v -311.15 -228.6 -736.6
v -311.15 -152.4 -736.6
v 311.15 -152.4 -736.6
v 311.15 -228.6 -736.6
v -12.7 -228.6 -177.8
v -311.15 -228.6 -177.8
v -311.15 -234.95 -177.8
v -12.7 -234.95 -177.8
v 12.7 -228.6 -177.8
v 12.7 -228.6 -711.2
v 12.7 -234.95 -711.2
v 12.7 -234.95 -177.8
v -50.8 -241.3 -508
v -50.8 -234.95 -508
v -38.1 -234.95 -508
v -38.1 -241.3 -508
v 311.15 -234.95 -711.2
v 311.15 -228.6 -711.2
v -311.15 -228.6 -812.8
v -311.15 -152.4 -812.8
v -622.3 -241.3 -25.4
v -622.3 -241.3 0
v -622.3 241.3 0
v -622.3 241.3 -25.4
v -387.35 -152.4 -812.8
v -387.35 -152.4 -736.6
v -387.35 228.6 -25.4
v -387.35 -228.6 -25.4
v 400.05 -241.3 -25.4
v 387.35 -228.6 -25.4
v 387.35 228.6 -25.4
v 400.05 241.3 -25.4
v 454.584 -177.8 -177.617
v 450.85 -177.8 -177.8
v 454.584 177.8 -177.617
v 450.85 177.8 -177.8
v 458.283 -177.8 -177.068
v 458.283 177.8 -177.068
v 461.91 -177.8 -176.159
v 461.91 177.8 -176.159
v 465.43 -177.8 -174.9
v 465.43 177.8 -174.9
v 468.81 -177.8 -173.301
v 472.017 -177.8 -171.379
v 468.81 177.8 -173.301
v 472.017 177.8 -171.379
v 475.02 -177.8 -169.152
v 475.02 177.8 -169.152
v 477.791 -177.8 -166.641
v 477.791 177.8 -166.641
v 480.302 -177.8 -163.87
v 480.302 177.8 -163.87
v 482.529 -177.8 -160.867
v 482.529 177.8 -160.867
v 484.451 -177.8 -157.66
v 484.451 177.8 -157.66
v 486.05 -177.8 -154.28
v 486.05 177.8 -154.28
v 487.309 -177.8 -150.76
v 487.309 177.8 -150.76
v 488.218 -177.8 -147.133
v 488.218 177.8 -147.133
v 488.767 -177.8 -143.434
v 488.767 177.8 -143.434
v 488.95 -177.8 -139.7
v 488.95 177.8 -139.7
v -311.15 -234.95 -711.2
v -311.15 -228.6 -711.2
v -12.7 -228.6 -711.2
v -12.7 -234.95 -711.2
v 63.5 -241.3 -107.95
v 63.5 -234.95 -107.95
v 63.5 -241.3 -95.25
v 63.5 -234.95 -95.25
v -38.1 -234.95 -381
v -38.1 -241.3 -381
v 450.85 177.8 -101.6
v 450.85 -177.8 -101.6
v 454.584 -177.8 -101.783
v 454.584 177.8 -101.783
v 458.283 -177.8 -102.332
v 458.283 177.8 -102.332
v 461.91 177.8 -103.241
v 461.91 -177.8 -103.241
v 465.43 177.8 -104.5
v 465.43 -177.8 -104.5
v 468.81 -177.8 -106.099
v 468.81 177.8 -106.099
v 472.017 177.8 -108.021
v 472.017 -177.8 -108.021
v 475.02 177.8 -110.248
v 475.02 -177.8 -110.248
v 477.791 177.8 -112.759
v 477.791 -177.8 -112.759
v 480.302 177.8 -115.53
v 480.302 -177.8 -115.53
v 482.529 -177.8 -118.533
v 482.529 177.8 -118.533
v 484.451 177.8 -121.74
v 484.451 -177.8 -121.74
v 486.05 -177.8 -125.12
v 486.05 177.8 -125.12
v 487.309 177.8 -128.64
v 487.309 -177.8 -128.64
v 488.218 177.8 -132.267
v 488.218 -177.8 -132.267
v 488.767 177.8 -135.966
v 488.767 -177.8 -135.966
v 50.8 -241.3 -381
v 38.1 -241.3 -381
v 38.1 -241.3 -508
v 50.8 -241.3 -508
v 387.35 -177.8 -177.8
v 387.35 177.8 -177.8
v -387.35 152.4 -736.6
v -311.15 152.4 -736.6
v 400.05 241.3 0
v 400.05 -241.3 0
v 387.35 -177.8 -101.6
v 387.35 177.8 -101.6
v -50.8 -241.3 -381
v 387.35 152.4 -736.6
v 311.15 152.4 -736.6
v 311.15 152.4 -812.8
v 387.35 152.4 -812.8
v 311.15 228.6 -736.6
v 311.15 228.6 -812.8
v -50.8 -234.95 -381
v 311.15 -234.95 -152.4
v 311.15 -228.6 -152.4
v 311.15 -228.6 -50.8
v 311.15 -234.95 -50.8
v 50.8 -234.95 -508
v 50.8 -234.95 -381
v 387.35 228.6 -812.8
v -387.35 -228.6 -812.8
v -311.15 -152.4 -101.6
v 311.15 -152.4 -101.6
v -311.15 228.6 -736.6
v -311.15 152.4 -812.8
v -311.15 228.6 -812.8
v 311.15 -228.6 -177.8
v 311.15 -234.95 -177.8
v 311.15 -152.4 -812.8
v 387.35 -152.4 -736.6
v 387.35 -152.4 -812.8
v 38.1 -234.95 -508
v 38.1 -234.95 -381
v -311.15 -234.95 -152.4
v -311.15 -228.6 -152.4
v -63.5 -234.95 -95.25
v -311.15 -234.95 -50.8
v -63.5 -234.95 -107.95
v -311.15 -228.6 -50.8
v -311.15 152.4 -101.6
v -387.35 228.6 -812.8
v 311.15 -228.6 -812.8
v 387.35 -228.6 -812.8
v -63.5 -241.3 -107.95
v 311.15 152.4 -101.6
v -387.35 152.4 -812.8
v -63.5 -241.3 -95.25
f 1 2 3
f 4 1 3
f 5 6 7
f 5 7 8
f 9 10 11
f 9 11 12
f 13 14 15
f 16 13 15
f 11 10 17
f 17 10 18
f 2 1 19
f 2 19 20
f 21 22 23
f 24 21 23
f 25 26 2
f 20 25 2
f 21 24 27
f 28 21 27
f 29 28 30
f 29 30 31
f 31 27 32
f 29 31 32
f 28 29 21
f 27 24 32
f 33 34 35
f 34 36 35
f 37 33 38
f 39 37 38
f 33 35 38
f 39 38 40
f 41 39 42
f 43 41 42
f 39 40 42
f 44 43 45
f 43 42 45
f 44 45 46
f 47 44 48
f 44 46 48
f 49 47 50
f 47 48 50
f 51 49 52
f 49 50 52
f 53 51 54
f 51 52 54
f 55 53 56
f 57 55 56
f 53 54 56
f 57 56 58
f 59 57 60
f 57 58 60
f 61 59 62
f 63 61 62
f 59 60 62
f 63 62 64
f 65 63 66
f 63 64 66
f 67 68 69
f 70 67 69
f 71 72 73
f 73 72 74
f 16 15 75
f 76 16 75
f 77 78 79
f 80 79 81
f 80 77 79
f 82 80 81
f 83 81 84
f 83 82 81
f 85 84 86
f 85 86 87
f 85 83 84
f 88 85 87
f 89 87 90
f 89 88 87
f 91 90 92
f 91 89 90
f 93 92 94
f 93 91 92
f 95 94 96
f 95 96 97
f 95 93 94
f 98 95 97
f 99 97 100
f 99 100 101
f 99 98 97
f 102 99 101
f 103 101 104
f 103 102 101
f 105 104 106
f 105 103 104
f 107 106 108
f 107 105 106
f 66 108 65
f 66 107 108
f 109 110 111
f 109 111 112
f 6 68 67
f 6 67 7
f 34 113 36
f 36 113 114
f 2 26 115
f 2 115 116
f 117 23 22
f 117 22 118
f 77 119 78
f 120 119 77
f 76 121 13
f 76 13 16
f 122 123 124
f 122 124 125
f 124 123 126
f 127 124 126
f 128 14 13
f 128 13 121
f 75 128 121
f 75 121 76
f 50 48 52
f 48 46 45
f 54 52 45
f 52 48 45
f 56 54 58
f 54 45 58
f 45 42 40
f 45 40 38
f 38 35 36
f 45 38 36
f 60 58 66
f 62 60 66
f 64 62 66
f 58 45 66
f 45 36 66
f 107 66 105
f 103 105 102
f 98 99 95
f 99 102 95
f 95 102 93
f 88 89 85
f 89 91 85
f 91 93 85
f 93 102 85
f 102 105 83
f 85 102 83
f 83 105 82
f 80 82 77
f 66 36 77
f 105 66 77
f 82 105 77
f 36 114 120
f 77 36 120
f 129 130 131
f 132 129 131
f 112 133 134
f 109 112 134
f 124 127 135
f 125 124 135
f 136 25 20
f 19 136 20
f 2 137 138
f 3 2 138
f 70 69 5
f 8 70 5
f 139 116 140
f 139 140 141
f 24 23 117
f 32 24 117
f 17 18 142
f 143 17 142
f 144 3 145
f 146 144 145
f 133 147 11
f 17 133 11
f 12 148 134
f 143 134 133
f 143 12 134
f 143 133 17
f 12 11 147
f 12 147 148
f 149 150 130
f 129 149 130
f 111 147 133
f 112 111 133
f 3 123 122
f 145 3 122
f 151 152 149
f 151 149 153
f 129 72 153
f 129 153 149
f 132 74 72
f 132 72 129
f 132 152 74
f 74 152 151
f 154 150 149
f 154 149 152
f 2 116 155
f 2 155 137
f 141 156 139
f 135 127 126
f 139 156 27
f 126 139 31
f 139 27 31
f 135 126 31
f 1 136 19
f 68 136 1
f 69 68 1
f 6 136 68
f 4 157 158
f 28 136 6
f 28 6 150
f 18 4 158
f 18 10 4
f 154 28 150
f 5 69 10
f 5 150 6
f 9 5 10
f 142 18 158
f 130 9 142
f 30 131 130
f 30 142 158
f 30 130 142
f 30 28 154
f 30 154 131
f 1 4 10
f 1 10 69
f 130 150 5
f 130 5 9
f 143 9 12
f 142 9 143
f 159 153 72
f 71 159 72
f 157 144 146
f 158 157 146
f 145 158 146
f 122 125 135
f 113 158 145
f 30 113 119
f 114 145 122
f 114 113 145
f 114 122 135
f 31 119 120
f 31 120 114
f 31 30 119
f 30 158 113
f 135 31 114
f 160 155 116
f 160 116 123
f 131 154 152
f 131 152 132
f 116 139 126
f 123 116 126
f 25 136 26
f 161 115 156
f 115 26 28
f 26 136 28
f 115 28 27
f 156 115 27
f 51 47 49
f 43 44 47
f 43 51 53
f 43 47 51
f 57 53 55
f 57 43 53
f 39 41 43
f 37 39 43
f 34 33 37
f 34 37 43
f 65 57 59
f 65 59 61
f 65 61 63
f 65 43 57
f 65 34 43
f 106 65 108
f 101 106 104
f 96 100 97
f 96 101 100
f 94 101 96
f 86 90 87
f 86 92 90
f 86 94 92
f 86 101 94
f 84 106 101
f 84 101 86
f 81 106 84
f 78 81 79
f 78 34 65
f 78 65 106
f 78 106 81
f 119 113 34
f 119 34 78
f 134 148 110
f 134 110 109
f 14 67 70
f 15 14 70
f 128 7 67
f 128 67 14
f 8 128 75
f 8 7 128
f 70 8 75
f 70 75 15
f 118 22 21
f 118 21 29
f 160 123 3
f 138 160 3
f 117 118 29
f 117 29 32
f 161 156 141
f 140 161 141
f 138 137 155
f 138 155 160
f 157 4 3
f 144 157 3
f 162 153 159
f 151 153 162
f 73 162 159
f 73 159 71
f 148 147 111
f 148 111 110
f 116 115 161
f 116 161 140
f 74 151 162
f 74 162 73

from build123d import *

# Parameters (mm, degrees)
F0_W      = 76.2
F0_H      = 76.2
F1_DEPTH  = 812.8
F2_DEPTH  = 736.6
F0_W_2    = 800.1
F0_H_2    = 482.6
F3_DEPTH  = 25.4
F4_W      = 355.6
F4_H      = 76.2
F5_DEPTH  = 101.6
F6_R      = 38.09999
F7_W      = 298.45
F7_H      = 533.4
F7_W_2    = 12.7
F7_H_2    = 127
F7_W_3    = 622.3
F7_H_3    = 101.6
F7_W_4    = 127
F7_H_4    = 12.7
F8_DEPTH  = 6.35
F9_DEPTH  = 12.7
F10_W     = 222.25
F10_H     = 482.6
F11_DEPTH = 25.4
F12_W     = 622.3
F12_H     = 304.8
F13_DEPTH = 635


# Not quite as in the source:
# - a fillet or chamfer is up to 0.001 mm smaller than in the source, because OpenCascade refuses the exact size


with BuildPart() as f1:
    # F0 (on Top) → F1 (new body)
    with BuildSketch(Plane.XY):
        with Locations((-349.25, 190.5)):
            Rectangle(F0_W, F0_H)
    extrude(amount=-F1_DEPTH)



with BuildPart() as f1b:
    # F0 (on Top) → F1, piece 2 (new body)
    with BuildSketch(Plane.XY):
        with Locations((-349.25, -190.5)):
            Rectangle(F0_W, F0_H)
    extrude(amount=-F1_DEPTH)


with BuildPart() as f1c:
    # F0 (on Top) → F1, piece 3 (new body)
    with BuildSketch(Plane.XY):
        with Locations((349.25, -190.5)):
            Rectangle(F0_W, F0_H)
    extrude(amount=-F1_DEPTH)


with BuildPart() as f1d:
    # F0 (on Top) → F1, piece 4 (new body)
    with BuildSketch(Plane.XY):
        with Locations((349.25, 190.5)):
            Rectangle(F0_W, F0_H)
    extrude(amount=-F1_DEPTH)


with BuildPart() as f1_1:
    add(f1.part)

    add(f1b.part)  # F2 merges F1b

    add(f1c.part)  # F2 merges F1c

    add(f1d.part)  # F2 merges F1d
    # F0 (on Top) → F2 (join)
    with BuildSketch(Plane.XY):
        with Locations((-349.25, 190.5)):
            Rectangle(F0_W, F0_H)
        Polygon((311.15, 152.4), (311.15, 228.6), (-311.15, 228.6), (-311.15, 152.4), (-387.35, 152.4), (-387.35, -152.4), (-311.15, -152.4), (-311.15, -228.6), (311.15, -228.6), (311.15, -152.4), (387.35, -152.4), (387.35, 152.4), align=None)
        with Locations((-349.25, -190.5)):
            Rectangle(F0_W, F0_H)
        with Locations((349.25, -190.5)):
            Rectangle(F0_W, F0_H)
        with Locations((349.25, 190.5)):
            Rectangle(F0_W, F0_H)
    extrude(amount=-F2_DEPTH)

    # F0 (on Top) → F3 (join)
    with BuildSketch(Plane.XY):
        Rectangle(F0_W_2, F0_H_2)
        Polygon((311.15, 228.6), (387.35, 228.6), (387.35, 152.4), (387.35, -152.4), (387.35, -228.6), (311.15, -228.6), (-311.15, -228.6), (-387.35, -228.6), (-387.35, -152.4), (-387.35, 152.4), (-387.35, 228.6), (-311.15, 228.6), align=None, mode=Mode.SUBTRACT)
    extrude(amount=-F3_DEPTH)

    # F4 (on face) → F5 (join)
    with BuildSketch(Plane.YZ.offset(387.35)):
        with Locations((0, -139.7)):
            Rectangle(F4_W, F4_H)
    extrude(amount=F5_DEPTH)

    # F6 (radius 38.1 in the source; OpenCascade refuses exactly that, so slightly less here)
    f6_edges = [f1_1.edges().sort_by_distance(p)[0] for p in [
        (488.95, 0, -101.6),
        (488.95, 0, -177.8),
    ]]
    fillet(f6_edges, radius=F6_R)

    # F7 (on face) → F8 (join)
    with BuildSketch(Plane.XZ.offset(228.6)):
        with Locations((161.925, -444.5)):
            Rectangle(F7_W, F7_H)
        with Locations((44.45, -444.5)):
            Rectangle(F7_W_2, F7_H_2, mode=Mode.SUBTRACT)
        with Locations((-161.925, -444.5)):
            Rectangle(F7_W, F7_H)
        with Locations((-44.45, -444.5)):
            Rectangle(F7_W_2, F7_H_2, mode=Mode.SUBTRACT)
        with Locations((0, -101.6)):
            Rectangle(F7_W_3, F7_H_3)
        with Locations((0, -101.6)):
            Rectangle(F7_W_4, F7_H_4, mode=Mode.SUBTRACT)
        with Locations((0, -101.6)):
            Rectangle(F7_W_4, F7_H_4)
        with Locations((44.45, -444.5)):
            Rectangle(F7_W_2, F7_H_2)
        with Locations((-44.45, -444.5)):
            Rectangle(F7_W_2, F7_H_2)
    extrude(amount=F8_DEPTH)

    # F7 (on face) → F9 (join)
    with BuildSketch(Plane.XZ.offset(228.6)):
        with Locations((0, -101.6)):
            Rectangle(F7_W_4, F7_H_4)
        with Locations((-44.45, -444.5)):
            Rectangle(F7_W_2, F7_H_2)
        with Locations((44.45, -444.5)):
            Rectangle(F7_W_2, F7_H_2)
    extrude(amount=F9_DEPTH)

    # F10 (on face) → F11 (join, through all)
    with BuildSketch(Plane.XY):
        with Locations((-511.175, 0)):
            Rectangle(F10_W, F10_H)
    extrude(amount=-F11_DEPTH)

    # F12 (on face) → F13 (cut)
    with BuildSketch(Plane(origin=(0, 0, -736.6), x_dir=(1, 0, 0), z_dir=(0, 0, -1))):
        Rectangle(F12_W, F12_H)
    extrude(amount=-F13_DEPTH, mode=Mode.SUBTRACT)


solid = f1_1.part
